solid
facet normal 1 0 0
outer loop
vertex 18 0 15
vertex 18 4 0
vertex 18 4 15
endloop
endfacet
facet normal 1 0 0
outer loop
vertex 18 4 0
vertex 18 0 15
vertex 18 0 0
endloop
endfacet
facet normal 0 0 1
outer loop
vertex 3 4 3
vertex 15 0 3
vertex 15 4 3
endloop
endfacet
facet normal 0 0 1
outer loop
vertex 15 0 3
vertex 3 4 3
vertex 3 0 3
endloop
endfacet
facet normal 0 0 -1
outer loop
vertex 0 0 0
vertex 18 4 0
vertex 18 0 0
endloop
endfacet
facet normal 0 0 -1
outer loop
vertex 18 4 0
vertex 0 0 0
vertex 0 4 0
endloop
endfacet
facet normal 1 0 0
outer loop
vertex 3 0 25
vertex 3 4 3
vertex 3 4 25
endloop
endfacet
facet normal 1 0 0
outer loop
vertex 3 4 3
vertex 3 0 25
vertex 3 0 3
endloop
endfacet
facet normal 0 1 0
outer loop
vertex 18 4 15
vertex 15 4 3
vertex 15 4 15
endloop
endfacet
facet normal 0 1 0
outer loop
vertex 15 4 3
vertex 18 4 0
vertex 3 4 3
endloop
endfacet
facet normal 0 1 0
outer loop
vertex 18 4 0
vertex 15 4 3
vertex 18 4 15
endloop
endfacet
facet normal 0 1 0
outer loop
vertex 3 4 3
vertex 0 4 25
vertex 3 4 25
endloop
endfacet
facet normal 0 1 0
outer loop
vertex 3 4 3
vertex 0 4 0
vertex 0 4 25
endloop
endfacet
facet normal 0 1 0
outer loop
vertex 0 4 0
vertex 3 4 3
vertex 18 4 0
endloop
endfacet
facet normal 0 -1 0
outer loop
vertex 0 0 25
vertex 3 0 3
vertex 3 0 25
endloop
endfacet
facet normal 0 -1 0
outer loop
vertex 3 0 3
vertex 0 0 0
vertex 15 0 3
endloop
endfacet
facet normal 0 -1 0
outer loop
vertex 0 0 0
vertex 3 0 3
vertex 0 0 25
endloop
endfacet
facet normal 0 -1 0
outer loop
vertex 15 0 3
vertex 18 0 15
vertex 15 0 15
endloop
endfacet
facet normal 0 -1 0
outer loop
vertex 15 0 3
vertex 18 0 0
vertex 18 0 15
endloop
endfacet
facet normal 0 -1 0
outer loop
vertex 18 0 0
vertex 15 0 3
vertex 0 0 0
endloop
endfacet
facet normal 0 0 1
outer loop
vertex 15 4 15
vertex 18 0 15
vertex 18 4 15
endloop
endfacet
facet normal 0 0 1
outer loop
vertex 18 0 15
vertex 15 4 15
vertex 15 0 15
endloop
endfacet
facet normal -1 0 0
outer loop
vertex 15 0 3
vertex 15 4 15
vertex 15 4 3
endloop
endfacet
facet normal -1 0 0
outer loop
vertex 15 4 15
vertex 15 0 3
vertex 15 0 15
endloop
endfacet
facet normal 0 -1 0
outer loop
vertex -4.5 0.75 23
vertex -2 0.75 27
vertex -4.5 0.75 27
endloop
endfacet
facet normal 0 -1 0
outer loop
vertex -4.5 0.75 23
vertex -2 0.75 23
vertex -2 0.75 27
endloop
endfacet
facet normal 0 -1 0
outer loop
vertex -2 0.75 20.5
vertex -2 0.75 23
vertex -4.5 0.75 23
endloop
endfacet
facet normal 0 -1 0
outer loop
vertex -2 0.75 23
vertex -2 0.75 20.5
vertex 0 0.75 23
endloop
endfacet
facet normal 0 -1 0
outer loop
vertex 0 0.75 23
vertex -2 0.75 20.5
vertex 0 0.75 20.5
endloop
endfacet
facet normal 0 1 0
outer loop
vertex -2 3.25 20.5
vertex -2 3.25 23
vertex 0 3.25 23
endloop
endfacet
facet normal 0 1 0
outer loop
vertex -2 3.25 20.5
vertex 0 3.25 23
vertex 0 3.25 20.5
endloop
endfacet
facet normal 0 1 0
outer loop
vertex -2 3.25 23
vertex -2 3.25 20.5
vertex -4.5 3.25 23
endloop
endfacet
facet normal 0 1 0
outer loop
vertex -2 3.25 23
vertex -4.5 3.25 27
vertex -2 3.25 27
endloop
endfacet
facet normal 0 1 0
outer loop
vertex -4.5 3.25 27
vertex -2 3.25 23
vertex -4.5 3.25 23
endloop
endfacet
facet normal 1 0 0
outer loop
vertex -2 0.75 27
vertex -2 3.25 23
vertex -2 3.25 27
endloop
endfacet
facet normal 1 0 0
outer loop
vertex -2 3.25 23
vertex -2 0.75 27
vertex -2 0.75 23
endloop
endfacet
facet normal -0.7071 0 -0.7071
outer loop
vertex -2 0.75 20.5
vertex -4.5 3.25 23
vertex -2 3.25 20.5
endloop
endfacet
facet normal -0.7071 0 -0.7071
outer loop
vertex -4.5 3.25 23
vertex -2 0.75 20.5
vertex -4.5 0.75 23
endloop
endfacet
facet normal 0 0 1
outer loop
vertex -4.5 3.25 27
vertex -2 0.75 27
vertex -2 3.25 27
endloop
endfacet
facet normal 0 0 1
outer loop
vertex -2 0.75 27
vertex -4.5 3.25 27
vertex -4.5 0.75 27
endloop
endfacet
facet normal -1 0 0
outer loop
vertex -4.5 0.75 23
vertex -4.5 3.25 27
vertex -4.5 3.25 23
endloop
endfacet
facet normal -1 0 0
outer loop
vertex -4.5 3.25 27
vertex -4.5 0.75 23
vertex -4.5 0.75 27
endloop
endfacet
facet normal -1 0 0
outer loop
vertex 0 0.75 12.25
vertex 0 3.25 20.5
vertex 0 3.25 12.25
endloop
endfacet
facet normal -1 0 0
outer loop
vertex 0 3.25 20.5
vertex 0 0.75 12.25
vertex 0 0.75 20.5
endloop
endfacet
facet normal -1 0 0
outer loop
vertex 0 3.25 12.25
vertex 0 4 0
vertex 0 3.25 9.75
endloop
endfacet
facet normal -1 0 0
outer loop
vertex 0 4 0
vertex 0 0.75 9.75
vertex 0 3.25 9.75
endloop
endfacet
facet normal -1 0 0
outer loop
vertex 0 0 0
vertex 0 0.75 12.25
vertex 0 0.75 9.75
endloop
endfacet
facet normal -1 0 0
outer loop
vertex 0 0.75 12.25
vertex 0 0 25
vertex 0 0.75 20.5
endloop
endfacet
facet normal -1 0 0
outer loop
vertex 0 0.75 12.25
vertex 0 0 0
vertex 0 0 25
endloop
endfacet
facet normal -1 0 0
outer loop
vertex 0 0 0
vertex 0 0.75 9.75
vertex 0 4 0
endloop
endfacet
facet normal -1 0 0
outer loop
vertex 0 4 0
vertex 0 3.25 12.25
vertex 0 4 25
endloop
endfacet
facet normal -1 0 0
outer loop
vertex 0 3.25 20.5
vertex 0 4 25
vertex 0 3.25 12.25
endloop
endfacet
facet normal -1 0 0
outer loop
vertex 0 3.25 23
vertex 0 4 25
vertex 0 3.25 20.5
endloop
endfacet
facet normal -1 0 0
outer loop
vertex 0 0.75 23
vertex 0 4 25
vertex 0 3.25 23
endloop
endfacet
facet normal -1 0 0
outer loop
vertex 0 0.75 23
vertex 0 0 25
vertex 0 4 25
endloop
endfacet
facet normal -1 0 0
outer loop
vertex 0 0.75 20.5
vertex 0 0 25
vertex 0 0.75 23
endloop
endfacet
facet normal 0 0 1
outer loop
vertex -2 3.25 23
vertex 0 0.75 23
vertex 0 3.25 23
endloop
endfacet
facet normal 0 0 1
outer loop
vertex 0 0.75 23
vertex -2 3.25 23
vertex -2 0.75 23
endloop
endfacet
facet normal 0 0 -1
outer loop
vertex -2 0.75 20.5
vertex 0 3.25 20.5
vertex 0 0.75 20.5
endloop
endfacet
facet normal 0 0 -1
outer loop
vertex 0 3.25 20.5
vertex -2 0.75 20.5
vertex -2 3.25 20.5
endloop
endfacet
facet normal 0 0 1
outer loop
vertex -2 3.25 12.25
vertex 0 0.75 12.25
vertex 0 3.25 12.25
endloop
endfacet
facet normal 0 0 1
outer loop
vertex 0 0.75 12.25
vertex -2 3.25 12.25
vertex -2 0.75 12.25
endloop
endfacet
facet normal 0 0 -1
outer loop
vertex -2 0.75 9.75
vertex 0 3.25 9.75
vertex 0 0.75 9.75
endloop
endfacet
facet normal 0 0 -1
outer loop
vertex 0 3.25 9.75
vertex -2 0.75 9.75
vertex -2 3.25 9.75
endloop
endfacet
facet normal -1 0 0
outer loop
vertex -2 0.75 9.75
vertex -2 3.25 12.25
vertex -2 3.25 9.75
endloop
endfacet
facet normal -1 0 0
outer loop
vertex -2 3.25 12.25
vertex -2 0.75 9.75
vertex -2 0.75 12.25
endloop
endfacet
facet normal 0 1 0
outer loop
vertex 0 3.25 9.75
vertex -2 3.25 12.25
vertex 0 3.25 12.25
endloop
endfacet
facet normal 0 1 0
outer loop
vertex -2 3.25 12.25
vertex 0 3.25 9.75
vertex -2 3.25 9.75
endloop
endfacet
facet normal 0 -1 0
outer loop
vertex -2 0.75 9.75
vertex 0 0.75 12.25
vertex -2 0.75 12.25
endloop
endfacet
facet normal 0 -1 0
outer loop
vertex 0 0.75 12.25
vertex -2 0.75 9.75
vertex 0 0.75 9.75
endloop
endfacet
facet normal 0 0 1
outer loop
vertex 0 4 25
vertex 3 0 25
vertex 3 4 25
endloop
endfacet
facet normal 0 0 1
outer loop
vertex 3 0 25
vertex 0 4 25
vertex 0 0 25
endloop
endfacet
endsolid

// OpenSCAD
// Board settings
$holeDistance = 12; // Distance between holes (C/C)
$holeRadius = 2.5;
$holesBetweenAttachmentPins = 4; // 
$boardThickness = 2;

// Hook settings
$width = 4;
$height = 25;
$thickness = 3;
$hookDepth = 15;
$hookHeight = 15;
$lockPinHeight = 4;
$lockPinWidth = $boardThickness;
$lockPinOffset = 2;

$lockPinTop = $height - ($holeRadius + $lockPinOffset);

createHook();

module createHook() {
    union(){
        cube([$thickness,$width,$height]);
       
        toolHook();
        
        $pinCount = ceil($width / ($holesBetweenAttachmentPins * $holeDistance));
        $pinWidth = $holesBetweenAttachmentPins * $holeDistance * ($pinCount-1);
        $translateY = $width - $pinWidth;
        
        translate([0,$translateY/2 - ($holeRadius/2),0])
        union(){
            for (i = [0 : $pinCount - 1] ){
                translate([0, i * ($holesBetweenAttachmentPins * $holeDistance), 0])
                attachementPins();
            }
        }
    }
}

module toolHook(){
    translate([$thickness,0,0]){
        cube([$hookDepth,$width,$thickness]);
    }
    
    translate([$hookDepth,0,0]){
        cube([$thickness,$width,$hookHeight]);
    }
}

module lockPin(){
   translate([-$lockPinWidth, 0, $lockPinTop]){
        cube([$lockPinWidth, $holeRadius, $holeRadius]);
    }
    
    translate([-$lockPinWidth - ($holeRadius), 0, $lockPinTop ]){
        translate([0,0,$holeRadius])
        cube([$holeRadius, $holeRadius, $lockPinHeight]);
        
        translate([$holeRadius,$holeRadius,$holeRadius])
        rotate([0,180,90])
        triangle($holeRadius,$holeRadius,$holeRadius);
    } 
}

module supportPin(){
    translate([-$boardThickness, $holeRadius, $lockPinTop - $holeDistance + ($holeRadius/2)]){
        translate([0,-$holeRadius,0])
        cube([$holeRadius, $holeRadius, $holeRadius]);
    }
}

module attachementPins(){ 
   lockPin();
   supportPin();
}

module triangle(height, width,depth ){
    rotate([0,0,0])
    
    union(){
        difference(){
            cube([height, width, depth]);
            
            translate([-(height/2),width,0])
            rotate([45,0,0])
                cube([height*2, width, depth*2]);
        }
    }
}
